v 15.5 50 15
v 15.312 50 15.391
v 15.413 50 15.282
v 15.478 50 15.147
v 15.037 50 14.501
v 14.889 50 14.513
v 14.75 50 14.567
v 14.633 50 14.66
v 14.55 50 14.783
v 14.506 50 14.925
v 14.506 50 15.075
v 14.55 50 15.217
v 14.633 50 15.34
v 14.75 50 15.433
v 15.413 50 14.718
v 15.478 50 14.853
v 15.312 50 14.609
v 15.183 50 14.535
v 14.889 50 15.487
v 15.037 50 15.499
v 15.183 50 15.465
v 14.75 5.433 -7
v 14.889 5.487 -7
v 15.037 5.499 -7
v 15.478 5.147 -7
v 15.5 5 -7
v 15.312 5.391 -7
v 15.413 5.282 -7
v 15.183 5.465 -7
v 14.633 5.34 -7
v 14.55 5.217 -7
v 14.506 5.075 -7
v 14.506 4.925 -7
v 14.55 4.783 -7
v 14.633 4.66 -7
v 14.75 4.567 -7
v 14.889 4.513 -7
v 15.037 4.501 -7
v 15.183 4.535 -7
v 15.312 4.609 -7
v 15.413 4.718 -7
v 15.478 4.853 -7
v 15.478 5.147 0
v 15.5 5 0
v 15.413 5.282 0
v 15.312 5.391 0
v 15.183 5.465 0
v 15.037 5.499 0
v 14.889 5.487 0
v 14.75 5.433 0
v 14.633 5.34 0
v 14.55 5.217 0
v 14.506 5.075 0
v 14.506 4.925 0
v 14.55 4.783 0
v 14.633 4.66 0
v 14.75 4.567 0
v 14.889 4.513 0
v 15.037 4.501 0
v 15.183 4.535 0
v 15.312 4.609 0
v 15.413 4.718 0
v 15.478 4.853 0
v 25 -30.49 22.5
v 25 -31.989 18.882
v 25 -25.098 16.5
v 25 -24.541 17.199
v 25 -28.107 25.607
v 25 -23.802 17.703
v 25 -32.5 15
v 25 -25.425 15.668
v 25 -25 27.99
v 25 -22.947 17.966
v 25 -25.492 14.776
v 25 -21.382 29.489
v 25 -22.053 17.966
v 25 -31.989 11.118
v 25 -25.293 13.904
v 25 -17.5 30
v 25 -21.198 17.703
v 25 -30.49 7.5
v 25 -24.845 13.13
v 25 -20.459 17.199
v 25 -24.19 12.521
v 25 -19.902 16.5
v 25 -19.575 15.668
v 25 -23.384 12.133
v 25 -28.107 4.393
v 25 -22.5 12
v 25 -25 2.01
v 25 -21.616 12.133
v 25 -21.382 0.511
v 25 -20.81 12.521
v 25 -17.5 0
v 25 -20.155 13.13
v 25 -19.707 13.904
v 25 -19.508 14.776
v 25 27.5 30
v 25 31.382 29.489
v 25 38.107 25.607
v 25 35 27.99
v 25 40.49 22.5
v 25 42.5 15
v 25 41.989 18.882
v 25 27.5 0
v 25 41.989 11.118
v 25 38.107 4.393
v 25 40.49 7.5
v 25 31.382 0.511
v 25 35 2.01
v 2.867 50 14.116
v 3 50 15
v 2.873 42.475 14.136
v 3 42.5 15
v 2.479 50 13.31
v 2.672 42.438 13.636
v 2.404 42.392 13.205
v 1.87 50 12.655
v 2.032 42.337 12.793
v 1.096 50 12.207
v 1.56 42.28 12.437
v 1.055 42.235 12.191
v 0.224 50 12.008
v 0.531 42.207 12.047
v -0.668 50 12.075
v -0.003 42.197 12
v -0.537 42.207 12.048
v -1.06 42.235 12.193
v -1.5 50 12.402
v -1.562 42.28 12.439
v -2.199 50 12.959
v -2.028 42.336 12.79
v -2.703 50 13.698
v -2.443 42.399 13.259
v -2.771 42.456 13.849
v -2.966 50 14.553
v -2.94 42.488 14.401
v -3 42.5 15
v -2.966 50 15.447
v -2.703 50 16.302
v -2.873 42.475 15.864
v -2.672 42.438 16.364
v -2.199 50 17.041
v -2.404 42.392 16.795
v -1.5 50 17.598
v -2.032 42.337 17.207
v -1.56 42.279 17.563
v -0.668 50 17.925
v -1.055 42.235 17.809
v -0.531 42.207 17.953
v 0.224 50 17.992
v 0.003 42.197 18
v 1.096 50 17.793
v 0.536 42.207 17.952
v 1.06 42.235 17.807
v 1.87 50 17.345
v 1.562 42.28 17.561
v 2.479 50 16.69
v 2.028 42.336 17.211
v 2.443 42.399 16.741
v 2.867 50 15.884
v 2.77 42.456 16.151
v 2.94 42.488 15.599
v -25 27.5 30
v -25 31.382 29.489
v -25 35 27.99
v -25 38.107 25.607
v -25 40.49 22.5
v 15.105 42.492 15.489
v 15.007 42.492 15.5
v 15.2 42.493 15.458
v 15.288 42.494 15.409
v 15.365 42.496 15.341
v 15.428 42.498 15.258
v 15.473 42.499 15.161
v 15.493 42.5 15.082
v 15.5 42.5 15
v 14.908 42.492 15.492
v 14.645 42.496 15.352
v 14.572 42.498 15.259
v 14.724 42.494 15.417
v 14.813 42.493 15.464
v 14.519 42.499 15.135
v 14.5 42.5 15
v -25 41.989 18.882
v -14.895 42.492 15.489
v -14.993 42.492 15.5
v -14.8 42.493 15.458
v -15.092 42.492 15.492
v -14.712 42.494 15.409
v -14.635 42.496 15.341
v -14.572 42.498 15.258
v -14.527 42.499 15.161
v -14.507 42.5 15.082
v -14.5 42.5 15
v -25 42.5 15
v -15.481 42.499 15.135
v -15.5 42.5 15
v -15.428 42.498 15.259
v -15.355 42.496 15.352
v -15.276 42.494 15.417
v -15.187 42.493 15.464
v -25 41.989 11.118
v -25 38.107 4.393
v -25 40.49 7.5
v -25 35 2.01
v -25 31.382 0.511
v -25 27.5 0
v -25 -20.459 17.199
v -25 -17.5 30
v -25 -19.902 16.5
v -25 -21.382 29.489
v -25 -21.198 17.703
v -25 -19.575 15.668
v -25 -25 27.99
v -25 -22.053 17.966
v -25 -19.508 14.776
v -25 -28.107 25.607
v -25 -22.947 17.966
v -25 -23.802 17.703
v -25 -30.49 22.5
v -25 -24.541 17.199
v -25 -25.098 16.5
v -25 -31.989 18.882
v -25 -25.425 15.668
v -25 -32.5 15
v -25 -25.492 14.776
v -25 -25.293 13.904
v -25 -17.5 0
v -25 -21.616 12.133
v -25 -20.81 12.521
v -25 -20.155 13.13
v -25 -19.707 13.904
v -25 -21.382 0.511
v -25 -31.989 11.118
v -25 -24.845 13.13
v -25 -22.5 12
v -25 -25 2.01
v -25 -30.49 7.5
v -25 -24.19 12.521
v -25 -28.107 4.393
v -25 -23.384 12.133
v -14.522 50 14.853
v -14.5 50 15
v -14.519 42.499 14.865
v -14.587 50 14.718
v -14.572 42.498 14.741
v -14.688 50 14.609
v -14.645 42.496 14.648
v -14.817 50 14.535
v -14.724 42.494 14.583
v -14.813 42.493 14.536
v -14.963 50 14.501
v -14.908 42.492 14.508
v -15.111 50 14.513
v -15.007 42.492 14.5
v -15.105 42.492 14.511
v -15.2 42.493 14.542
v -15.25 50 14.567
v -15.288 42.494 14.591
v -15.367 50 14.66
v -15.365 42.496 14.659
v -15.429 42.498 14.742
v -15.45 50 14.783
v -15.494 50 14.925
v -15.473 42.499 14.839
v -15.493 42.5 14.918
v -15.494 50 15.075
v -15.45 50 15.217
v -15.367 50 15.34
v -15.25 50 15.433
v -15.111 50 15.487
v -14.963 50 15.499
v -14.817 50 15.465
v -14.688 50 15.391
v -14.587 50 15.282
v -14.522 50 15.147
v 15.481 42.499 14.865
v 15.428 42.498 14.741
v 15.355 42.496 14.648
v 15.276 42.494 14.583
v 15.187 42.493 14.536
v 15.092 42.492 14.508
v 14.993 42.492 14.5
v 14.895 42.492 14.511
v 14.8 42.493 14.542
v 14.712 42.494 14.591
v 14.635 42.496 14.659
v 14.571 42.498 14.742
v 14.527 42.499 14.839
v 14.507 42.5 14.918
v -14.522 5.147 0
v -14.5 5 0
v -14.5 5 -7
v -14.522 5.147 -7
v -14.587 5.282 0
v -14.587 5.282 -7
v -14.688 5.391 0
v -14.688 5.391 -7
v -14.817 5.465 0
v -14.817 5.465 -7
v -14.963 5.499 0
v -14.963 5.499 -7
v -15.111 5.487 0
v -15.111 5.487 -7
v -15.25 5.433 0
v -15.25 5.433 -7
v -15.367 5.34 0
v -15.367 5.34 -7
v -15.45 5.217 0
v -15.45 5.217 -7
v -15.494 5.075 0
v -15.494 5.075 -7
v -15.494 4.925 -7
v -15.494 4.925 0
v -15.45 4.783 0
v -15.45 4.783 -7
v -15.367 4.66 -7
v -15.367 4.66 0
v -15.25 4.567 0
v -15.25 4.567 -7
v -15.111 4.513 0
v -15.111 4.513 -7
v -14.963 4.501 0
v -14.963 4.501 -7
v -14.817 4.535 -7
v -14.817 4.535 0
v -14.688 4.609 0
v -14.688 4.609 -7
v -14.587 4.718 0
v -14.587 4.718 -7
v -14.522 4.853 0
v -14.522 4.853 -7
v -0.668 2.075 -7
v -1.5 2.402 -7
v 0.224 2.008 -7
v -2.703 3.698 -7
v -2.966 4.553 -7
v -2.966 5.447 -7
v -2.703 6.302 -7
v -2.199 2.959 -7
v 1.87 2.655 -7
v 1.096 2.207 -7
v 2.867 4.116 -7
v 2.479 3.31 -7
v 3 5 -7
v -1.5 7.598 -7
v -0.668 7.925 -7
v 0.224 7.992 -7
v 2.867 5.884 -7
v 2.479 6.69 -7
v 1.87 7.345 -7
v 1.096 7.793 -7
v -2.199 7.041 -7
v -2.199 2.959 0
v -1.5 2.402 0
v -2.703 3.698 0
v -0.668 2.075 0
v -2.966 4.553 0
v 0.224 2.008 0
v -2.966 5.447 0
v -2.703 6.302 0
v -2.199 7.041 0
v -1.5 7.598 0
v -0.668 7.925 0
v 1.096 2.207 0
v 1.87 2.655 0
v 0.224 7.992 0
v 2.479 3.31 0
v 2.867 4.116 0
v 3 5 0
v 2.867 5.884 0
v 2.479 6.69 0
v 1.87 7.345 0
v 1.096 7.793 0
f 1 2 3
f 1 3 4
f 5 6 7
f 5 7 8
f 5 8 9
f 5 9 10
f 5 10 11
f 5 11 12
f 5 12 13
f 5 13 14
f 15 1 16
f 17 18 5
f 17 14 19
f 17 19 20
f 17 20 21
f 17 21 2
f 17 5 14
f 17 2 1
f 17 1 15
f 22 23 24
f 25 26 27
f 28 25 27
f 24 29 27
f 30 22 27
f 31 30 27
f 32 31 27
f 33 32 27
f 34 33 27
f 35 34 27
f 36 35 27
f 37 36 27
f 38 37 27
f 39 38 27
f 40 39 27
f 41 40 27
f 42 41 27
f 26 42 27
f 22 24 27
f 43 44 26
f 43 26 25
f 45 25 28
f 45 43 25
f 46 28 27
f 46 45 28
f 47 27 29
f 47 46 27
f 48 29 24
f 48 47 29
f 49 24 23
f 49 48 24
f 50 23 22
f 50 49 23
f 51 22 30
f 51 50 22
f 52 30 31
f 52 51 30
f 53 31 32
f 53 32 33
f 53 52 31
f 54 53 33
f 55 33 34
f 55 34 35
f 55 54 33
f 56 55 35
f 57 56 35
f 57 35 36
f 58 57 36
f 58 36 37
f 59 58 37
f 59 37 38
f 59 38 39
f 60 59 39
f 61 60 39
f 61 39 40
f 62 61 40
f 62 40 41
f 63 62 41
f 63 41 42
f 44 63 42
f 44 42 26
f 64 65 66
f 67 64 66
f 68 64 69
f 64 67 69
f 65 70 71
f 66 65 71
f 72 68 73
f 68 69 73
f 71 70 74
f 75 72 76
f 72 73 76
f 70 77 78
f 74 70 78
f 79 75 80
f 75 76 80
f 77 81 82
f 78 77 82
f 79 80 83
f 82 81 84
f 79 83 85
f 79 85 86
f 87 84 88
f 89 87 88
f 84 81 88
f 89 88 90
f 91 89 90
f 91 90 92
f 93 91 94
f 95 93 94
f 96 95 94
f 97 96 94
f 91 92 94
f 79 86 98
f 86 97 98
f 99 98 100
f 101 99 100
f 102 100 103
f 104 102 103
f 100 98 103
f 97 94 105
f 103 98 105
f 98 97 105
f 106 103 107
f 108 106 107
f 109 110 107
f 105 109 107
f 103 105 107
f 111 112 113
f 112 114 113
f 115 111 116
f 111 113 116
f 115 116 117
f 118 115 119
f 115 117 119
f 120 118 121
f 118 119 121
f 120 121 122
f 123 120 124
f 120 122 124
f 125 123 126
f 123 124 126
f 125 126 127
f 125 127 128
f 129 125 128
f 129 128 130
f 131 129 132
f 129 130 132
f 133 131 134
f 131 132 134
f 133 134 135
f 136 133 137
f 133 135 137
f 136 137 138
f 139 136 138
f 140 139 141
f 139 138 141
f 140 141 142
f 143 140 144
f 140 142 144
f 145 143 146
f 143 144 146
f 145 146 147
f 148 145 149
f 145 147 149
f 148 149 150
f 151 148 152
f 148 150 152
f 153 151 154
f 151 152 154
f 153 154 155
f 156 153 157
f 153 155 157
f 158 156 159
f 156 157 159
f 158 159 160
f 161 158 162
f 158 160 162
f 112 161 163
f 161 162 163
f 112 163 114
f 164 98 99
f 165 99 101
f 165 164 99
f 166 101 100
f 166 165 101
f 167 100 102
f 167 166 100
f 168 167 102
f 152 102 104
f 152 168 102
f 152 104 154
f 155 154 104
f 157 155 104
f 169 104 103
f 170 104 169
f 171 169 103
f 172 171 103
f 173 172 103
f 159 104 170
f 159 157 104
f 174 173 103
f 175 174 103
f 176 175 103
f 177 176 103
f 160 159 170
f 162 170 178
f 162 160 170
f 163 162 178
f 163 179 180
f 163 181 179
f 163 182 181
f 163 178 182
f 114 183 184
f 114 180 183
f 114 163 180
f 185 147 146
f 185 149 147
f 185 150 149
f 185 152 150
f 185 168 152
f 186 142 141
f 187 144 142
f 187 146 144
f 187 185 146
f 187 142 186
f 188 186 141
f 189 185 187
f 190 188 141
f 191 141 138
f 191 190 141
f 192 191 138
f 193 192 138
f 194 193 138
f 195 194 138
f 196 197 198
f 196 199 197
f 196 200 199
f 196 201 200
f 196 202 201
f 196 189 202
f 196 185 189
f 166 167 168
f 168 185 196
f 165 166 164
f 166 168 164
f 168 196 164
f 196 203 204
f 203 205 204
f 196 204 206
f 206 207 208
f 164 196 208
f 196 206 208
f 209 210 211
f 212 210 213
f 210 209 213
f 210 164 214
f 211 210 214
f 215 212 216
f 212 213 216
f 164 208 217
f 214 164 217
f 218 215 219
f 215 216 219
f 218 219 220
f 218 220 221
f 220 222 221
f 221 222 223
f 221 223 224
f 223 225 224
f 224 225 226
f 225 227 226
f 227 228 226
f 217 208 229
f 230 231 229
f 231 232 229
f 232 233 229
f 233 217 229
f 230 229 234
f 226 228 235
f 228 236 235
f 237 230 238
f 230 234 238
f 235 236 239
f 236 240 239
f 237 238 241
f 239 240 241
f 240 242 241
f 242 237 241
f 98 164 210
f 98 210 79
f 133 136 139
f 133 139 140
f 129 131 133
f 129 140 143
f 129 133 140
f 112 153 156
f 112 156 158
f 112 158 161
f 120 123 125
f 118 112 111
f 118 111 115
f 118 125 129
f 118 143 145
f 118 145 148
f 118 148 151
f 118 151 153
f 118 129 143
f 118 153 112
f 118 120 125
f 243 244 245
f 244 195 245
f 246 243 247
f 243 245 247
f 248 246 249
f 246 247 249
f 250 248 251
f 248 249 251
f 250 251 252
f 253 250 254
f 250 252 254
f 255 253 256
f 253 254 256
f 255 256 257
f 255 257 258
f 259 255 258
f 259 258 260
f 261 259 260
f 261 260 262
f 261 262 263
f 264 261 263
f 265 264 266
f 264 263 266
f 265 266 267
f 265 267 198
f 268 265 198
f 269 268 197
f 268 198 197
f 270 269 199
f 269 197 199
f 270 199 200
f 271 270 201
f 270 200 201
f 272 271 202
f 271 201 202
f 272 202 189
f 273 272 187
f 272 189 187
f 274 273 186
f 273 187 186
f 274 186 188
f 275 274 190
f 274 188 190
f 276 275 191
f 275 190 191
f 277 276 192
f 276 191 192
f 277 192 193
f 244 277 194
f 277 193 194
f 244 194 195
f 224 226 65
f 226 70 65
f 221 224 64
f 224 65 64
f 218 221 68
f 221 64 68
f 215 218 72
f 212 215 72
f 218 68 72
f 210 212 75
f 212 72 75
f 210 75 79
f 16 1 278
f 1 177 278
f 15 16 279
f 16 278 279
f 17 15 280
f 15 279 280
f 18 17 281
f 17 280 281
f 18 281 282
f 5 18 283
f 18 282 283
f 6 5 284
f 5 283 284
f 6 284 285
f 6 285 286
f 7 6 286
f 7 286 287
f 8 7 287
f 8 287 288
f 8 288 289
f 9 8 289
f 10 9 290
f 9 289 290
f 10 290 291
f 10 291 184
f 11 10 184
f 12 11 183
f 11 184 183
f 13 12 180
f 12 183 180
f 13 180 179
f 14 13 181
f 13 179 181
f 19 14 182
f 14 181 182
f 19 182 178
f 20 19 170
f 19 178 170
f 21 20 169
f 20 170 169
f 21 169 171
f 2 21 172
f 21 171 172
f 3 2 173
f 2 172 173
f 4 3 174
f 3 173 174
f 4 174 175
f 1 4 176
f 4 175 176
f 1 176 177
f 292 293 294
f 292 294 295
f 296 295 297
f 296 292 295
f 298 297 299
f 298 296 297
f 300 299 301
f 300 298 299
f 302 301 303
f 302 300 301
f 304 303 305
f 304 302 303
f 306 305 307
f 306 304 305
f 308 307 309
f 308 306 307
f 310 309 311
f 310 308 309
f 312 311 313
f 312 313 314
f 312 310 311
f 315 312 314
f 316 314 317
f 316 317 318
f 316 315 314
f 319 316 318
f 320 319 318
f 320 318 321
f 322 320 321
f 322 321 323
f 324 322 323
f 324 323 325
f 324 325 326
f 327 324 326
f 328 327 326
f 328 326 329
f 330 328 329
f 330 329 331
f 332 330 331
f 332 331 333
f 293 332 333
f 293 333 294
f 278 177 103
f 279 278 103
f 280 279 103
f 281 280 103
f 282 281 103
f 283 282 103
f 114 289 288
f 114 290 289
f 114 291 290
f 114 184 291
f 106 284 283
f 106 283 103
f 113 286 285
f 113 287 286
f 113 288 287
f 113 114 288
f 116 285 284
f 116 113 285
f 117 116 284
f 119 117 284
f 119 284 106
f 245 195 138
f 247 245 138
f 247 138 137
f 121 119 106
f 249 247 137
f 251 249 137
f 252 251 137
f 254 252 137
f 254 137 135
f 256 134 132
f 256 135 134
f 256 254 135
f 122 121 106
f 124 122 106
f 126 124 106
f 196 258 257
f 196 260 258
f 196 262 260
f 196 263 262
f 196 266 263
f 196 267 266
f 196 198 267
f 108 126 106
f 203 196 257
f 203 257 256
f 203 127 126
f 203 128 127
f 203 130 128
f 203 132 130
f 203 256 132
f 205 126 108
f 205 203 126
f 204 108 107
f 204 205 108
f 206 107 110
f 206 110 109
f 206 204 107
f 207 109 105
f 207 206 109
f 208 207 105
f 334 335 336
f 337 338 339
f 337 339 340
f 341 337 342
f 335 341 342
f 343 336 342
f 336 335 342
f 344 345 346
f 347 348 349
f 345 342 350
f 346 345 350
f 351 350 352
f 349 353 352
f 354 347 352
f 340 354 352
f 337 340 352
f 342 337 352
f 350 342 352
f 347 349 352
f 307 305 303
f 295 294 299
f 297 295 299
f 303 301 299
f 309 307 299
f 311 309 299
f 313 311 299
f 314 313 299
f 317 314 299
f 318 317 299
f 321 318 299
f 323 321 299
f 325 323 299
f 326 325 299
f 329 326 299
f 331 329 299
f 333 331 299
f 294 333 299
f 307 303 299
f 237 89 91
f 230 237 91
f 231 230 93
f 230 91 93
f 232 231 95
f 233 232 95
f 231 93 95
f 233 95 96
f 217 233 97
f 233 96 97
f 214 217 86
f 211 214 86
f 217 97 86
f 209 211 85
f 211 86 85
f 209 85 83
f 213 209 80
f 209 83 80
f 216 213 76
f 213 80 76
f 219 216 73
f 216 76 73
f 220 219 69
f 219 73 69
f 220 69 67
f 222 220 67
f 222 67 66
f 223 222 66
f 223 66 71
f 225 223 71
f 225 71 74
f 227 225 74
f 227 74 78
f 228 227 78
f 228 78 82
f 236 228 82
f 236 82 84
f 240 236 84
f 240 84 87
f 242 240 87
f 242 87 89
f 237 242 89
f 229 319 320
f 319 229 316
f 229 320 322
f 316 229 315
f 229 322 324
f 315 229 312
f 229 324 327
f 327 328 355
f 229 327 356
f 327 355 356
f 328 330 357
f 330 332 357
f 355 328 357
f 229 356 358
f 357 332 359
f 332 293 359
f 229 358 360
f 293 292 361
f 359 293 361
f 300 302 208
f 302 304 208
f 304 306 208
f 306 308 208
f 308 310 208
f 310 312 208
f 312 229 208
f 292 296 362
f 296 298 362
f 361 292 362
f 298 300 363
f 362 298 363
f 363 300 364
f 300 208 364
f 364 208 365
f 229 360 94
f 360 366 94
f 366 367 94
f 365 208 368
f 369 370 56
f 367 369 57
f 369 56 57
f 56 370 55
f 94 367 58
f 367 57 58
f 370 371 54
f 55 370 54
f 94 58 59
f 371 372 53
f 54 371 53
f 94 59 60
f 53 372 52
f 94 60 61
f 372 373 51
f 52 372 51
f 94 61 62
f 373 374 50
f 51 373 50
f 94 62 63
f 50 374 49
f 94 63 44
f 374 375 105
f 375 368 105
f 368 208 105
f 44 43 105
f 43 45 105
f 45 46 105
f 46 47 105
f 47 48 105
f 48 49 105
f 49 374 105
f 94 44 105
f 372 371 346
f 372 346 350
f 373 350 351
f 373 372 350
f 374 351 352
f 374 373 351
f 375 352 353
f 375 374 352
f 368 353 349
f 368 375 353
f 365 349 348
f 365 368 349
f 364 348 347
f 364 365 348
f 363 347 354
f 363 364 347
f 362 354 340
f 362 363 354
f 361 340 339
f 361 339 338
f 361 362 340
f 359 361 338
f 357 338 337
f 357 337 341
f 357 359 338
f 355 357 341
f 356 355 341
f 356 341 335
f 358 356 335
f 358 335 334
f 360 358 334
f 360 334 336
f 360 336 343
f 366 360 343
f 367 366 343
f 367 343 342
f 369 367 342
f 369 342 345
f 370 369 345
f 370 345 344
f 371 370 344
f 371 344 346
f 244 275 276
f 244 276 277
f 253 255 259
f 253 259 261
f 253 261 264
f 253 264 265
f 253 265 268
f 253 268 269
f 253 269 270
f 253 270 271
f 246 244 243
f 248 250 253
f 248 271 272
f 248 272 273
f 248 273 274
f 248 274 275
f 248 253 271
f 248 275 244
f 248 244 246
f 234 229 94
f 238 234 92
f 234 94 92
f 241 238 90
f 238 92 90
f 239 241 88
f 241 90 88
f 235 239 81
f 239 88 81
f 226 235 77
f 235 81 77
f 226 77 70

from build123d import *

# Parameters (mm, degrees)
EXTRUDE_1_DEPTH     = 30
SKETCH_2_R          = 3
CUT_EXTRUDE_1_DEPTH = 52
FILLET_1_R          = 15
FILLET_2_R          = 15
FILLET_3_R          = 15
FILLET_4_R          = 15
SKETCH_4_R          = 3
SKETCH_4_R_2        = 0.5
EXTRUDE_2_DEPTH     = 50
SKETCH_5_R          = 3
SKETCH_5_R_2        = 0.5
EXTRUDE_3_DEPTH     = 37


with BuildPart() as part:
    # 草图1 → 凸台-拉伸1 (new body)
    with BuildSketch(Plane.XY):
        Polygon((25, 0), (25, 42.5), (-25, 42.5), (-25, -32.5), (25, -32.5), align=None)
    extrude(amount=EXTRUDE_1_DEPTH)

    # 草图2 → 切除-拉伸1 (cut)
    with BuildSketch(Plane(origin=(25, 0, 0), x_dir=(0, 0, -1), z_dir=(1, 0, 0))):
        with Locations((-15, -22.5)):
            Circle(SKETCH_2_R)
    extrude(amount=-CUT_EXTRUDE_1_DEPTH, mode=Mode.SUBTRACT)

    # 圆角1
    fillet_1_edges = [part.edges().sort_by_distance(p)[0] for p in [
        (0, -32.5, 0),
    ]]
    fillet(fillet_1_edges, radius=FILLET_1_R)

    # 圆角2
    fillet_2_edges = [part.edges().sort_by_distance(p)[0] for p in [
        (0, -32.5, 30),
    ]]
    fillet(fillet_2_edges, radius=FILLET_2_R - 0.0001)  # a hair under: the kernel refuses the full size

    # 圆角3
    fillet_3_edges = [part.edges().sort_by_distance(p)[0] for p in [
        (0, 42.5, 30),
    ]]
    fillet(fillet_3_edges, radius=FILLET_3_R)

    # 圆角4
    fillet_4_edges = [part.edges().sort_by_distance(p)[0] for p in [
        (0, 42.5, 0),
    ]]
    fillet(fillet_4_edges, radius=FILLET_4_R - 0.0001)  # a hair under: the kernel refuses the full size

    # 草图4 → 凸台-拉伸2 (add)
    with BuildSketch(Plane(origin=(0, 0, 0), x_dir=(1, 0, 0), z_dir=(0, 1, 0))):
        with Locations((0, -15)):
            Circle(SKETCH_4_R)
        with Locations((15, -15)):
            Circle(SKETCH_4_R_2)
        with Locations((-15, -15)):
            Circle(SKETCH_4_R_2)
    extrude(amount=EXTRUDE_2_DEPTH)

    # 草图5 → 凸台-拉伸3 (add)
    with BuildSketch(Plane.XY.offset(30)):
        with Locations((0, 5)):
            Circle(SKETCH_5_R)
        with Locations((-15, 5)):
            Circle(SKETCH_5_R_2)
        with Locations((15, 5)):
            Circle(SKETCH_5_R_2)
    extrude(amount=-EXTRUDE_3_DEPTH)


solid = part.part
